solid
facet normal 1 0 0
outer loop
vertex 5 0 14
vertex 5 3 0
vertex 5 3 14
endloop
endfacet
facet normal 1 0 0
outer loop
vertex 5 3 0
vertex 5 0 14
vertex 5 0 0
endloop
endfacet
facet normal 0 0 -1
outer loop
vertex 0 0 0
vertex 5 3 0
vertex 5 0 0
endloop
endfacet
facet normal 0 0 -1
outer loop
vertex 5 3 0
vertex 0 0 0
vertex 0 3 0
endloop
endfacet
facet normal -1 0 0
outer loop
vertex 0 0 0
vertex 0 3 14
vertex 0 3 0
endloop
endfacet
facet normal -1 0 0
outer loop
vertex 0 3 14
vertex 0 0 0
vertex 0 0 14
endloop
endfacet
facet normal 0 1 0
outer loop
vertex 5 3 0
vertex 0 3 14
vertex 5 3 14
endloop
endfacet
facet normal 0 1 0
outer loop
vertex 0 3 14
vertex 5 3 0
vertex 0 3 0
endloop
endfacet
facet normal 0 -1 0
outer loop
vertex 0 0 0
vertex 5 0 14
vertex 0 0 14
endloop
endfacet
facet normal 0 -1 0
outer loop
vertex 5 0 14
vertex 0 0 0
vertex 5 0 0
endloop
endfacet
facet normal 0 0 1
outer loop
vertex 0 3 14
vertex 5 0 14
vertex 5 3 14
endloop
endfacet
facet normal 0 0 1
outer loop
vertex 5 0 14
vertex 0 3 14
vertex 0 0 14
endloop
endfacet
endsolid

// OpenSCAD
translate([2.5, 1.5, 1.0]) color([0.7893377392253591, 0.38887513002224416, 0.806846018820692]) cube([5, 3, 2], center=true);
translate([2.5, 1.5, 3.0]) color([0.3895364160074527, 0.2201595216660458, 0.19619466691666865]) cube([5, 3, 2], center=true);
translate([2.5, 1.5, 5.0]) color([0.9400346443375104, 0.58653025858102, 0.04979326505826487]) cube([5, 3, 2], center=true);
translate([2.5, 1.5, 7.0]) color([0.38834759617804915, 0.234029260524927, 0.08465706460929934]) cube([5, 3, 2], center=true);
translate([2.5, 1.5, 9.0]) color([0.18675586852140846, 0.05699047999950346, 0.6380736282281027]) cube([5, 3, 2], center=true);
translate([2.5, 1.5, 11.0]) color([0.17337386483746886, 0.6107798762435255, 0.6125067478912297]) cube([5, 3, 2], center=true);
translate([2.5, 1.5, 13.0]) color([0.7049237107399368, 0.5121186506114312, 0.28442399033479826]) cube([5, 3, 2], center=true);
